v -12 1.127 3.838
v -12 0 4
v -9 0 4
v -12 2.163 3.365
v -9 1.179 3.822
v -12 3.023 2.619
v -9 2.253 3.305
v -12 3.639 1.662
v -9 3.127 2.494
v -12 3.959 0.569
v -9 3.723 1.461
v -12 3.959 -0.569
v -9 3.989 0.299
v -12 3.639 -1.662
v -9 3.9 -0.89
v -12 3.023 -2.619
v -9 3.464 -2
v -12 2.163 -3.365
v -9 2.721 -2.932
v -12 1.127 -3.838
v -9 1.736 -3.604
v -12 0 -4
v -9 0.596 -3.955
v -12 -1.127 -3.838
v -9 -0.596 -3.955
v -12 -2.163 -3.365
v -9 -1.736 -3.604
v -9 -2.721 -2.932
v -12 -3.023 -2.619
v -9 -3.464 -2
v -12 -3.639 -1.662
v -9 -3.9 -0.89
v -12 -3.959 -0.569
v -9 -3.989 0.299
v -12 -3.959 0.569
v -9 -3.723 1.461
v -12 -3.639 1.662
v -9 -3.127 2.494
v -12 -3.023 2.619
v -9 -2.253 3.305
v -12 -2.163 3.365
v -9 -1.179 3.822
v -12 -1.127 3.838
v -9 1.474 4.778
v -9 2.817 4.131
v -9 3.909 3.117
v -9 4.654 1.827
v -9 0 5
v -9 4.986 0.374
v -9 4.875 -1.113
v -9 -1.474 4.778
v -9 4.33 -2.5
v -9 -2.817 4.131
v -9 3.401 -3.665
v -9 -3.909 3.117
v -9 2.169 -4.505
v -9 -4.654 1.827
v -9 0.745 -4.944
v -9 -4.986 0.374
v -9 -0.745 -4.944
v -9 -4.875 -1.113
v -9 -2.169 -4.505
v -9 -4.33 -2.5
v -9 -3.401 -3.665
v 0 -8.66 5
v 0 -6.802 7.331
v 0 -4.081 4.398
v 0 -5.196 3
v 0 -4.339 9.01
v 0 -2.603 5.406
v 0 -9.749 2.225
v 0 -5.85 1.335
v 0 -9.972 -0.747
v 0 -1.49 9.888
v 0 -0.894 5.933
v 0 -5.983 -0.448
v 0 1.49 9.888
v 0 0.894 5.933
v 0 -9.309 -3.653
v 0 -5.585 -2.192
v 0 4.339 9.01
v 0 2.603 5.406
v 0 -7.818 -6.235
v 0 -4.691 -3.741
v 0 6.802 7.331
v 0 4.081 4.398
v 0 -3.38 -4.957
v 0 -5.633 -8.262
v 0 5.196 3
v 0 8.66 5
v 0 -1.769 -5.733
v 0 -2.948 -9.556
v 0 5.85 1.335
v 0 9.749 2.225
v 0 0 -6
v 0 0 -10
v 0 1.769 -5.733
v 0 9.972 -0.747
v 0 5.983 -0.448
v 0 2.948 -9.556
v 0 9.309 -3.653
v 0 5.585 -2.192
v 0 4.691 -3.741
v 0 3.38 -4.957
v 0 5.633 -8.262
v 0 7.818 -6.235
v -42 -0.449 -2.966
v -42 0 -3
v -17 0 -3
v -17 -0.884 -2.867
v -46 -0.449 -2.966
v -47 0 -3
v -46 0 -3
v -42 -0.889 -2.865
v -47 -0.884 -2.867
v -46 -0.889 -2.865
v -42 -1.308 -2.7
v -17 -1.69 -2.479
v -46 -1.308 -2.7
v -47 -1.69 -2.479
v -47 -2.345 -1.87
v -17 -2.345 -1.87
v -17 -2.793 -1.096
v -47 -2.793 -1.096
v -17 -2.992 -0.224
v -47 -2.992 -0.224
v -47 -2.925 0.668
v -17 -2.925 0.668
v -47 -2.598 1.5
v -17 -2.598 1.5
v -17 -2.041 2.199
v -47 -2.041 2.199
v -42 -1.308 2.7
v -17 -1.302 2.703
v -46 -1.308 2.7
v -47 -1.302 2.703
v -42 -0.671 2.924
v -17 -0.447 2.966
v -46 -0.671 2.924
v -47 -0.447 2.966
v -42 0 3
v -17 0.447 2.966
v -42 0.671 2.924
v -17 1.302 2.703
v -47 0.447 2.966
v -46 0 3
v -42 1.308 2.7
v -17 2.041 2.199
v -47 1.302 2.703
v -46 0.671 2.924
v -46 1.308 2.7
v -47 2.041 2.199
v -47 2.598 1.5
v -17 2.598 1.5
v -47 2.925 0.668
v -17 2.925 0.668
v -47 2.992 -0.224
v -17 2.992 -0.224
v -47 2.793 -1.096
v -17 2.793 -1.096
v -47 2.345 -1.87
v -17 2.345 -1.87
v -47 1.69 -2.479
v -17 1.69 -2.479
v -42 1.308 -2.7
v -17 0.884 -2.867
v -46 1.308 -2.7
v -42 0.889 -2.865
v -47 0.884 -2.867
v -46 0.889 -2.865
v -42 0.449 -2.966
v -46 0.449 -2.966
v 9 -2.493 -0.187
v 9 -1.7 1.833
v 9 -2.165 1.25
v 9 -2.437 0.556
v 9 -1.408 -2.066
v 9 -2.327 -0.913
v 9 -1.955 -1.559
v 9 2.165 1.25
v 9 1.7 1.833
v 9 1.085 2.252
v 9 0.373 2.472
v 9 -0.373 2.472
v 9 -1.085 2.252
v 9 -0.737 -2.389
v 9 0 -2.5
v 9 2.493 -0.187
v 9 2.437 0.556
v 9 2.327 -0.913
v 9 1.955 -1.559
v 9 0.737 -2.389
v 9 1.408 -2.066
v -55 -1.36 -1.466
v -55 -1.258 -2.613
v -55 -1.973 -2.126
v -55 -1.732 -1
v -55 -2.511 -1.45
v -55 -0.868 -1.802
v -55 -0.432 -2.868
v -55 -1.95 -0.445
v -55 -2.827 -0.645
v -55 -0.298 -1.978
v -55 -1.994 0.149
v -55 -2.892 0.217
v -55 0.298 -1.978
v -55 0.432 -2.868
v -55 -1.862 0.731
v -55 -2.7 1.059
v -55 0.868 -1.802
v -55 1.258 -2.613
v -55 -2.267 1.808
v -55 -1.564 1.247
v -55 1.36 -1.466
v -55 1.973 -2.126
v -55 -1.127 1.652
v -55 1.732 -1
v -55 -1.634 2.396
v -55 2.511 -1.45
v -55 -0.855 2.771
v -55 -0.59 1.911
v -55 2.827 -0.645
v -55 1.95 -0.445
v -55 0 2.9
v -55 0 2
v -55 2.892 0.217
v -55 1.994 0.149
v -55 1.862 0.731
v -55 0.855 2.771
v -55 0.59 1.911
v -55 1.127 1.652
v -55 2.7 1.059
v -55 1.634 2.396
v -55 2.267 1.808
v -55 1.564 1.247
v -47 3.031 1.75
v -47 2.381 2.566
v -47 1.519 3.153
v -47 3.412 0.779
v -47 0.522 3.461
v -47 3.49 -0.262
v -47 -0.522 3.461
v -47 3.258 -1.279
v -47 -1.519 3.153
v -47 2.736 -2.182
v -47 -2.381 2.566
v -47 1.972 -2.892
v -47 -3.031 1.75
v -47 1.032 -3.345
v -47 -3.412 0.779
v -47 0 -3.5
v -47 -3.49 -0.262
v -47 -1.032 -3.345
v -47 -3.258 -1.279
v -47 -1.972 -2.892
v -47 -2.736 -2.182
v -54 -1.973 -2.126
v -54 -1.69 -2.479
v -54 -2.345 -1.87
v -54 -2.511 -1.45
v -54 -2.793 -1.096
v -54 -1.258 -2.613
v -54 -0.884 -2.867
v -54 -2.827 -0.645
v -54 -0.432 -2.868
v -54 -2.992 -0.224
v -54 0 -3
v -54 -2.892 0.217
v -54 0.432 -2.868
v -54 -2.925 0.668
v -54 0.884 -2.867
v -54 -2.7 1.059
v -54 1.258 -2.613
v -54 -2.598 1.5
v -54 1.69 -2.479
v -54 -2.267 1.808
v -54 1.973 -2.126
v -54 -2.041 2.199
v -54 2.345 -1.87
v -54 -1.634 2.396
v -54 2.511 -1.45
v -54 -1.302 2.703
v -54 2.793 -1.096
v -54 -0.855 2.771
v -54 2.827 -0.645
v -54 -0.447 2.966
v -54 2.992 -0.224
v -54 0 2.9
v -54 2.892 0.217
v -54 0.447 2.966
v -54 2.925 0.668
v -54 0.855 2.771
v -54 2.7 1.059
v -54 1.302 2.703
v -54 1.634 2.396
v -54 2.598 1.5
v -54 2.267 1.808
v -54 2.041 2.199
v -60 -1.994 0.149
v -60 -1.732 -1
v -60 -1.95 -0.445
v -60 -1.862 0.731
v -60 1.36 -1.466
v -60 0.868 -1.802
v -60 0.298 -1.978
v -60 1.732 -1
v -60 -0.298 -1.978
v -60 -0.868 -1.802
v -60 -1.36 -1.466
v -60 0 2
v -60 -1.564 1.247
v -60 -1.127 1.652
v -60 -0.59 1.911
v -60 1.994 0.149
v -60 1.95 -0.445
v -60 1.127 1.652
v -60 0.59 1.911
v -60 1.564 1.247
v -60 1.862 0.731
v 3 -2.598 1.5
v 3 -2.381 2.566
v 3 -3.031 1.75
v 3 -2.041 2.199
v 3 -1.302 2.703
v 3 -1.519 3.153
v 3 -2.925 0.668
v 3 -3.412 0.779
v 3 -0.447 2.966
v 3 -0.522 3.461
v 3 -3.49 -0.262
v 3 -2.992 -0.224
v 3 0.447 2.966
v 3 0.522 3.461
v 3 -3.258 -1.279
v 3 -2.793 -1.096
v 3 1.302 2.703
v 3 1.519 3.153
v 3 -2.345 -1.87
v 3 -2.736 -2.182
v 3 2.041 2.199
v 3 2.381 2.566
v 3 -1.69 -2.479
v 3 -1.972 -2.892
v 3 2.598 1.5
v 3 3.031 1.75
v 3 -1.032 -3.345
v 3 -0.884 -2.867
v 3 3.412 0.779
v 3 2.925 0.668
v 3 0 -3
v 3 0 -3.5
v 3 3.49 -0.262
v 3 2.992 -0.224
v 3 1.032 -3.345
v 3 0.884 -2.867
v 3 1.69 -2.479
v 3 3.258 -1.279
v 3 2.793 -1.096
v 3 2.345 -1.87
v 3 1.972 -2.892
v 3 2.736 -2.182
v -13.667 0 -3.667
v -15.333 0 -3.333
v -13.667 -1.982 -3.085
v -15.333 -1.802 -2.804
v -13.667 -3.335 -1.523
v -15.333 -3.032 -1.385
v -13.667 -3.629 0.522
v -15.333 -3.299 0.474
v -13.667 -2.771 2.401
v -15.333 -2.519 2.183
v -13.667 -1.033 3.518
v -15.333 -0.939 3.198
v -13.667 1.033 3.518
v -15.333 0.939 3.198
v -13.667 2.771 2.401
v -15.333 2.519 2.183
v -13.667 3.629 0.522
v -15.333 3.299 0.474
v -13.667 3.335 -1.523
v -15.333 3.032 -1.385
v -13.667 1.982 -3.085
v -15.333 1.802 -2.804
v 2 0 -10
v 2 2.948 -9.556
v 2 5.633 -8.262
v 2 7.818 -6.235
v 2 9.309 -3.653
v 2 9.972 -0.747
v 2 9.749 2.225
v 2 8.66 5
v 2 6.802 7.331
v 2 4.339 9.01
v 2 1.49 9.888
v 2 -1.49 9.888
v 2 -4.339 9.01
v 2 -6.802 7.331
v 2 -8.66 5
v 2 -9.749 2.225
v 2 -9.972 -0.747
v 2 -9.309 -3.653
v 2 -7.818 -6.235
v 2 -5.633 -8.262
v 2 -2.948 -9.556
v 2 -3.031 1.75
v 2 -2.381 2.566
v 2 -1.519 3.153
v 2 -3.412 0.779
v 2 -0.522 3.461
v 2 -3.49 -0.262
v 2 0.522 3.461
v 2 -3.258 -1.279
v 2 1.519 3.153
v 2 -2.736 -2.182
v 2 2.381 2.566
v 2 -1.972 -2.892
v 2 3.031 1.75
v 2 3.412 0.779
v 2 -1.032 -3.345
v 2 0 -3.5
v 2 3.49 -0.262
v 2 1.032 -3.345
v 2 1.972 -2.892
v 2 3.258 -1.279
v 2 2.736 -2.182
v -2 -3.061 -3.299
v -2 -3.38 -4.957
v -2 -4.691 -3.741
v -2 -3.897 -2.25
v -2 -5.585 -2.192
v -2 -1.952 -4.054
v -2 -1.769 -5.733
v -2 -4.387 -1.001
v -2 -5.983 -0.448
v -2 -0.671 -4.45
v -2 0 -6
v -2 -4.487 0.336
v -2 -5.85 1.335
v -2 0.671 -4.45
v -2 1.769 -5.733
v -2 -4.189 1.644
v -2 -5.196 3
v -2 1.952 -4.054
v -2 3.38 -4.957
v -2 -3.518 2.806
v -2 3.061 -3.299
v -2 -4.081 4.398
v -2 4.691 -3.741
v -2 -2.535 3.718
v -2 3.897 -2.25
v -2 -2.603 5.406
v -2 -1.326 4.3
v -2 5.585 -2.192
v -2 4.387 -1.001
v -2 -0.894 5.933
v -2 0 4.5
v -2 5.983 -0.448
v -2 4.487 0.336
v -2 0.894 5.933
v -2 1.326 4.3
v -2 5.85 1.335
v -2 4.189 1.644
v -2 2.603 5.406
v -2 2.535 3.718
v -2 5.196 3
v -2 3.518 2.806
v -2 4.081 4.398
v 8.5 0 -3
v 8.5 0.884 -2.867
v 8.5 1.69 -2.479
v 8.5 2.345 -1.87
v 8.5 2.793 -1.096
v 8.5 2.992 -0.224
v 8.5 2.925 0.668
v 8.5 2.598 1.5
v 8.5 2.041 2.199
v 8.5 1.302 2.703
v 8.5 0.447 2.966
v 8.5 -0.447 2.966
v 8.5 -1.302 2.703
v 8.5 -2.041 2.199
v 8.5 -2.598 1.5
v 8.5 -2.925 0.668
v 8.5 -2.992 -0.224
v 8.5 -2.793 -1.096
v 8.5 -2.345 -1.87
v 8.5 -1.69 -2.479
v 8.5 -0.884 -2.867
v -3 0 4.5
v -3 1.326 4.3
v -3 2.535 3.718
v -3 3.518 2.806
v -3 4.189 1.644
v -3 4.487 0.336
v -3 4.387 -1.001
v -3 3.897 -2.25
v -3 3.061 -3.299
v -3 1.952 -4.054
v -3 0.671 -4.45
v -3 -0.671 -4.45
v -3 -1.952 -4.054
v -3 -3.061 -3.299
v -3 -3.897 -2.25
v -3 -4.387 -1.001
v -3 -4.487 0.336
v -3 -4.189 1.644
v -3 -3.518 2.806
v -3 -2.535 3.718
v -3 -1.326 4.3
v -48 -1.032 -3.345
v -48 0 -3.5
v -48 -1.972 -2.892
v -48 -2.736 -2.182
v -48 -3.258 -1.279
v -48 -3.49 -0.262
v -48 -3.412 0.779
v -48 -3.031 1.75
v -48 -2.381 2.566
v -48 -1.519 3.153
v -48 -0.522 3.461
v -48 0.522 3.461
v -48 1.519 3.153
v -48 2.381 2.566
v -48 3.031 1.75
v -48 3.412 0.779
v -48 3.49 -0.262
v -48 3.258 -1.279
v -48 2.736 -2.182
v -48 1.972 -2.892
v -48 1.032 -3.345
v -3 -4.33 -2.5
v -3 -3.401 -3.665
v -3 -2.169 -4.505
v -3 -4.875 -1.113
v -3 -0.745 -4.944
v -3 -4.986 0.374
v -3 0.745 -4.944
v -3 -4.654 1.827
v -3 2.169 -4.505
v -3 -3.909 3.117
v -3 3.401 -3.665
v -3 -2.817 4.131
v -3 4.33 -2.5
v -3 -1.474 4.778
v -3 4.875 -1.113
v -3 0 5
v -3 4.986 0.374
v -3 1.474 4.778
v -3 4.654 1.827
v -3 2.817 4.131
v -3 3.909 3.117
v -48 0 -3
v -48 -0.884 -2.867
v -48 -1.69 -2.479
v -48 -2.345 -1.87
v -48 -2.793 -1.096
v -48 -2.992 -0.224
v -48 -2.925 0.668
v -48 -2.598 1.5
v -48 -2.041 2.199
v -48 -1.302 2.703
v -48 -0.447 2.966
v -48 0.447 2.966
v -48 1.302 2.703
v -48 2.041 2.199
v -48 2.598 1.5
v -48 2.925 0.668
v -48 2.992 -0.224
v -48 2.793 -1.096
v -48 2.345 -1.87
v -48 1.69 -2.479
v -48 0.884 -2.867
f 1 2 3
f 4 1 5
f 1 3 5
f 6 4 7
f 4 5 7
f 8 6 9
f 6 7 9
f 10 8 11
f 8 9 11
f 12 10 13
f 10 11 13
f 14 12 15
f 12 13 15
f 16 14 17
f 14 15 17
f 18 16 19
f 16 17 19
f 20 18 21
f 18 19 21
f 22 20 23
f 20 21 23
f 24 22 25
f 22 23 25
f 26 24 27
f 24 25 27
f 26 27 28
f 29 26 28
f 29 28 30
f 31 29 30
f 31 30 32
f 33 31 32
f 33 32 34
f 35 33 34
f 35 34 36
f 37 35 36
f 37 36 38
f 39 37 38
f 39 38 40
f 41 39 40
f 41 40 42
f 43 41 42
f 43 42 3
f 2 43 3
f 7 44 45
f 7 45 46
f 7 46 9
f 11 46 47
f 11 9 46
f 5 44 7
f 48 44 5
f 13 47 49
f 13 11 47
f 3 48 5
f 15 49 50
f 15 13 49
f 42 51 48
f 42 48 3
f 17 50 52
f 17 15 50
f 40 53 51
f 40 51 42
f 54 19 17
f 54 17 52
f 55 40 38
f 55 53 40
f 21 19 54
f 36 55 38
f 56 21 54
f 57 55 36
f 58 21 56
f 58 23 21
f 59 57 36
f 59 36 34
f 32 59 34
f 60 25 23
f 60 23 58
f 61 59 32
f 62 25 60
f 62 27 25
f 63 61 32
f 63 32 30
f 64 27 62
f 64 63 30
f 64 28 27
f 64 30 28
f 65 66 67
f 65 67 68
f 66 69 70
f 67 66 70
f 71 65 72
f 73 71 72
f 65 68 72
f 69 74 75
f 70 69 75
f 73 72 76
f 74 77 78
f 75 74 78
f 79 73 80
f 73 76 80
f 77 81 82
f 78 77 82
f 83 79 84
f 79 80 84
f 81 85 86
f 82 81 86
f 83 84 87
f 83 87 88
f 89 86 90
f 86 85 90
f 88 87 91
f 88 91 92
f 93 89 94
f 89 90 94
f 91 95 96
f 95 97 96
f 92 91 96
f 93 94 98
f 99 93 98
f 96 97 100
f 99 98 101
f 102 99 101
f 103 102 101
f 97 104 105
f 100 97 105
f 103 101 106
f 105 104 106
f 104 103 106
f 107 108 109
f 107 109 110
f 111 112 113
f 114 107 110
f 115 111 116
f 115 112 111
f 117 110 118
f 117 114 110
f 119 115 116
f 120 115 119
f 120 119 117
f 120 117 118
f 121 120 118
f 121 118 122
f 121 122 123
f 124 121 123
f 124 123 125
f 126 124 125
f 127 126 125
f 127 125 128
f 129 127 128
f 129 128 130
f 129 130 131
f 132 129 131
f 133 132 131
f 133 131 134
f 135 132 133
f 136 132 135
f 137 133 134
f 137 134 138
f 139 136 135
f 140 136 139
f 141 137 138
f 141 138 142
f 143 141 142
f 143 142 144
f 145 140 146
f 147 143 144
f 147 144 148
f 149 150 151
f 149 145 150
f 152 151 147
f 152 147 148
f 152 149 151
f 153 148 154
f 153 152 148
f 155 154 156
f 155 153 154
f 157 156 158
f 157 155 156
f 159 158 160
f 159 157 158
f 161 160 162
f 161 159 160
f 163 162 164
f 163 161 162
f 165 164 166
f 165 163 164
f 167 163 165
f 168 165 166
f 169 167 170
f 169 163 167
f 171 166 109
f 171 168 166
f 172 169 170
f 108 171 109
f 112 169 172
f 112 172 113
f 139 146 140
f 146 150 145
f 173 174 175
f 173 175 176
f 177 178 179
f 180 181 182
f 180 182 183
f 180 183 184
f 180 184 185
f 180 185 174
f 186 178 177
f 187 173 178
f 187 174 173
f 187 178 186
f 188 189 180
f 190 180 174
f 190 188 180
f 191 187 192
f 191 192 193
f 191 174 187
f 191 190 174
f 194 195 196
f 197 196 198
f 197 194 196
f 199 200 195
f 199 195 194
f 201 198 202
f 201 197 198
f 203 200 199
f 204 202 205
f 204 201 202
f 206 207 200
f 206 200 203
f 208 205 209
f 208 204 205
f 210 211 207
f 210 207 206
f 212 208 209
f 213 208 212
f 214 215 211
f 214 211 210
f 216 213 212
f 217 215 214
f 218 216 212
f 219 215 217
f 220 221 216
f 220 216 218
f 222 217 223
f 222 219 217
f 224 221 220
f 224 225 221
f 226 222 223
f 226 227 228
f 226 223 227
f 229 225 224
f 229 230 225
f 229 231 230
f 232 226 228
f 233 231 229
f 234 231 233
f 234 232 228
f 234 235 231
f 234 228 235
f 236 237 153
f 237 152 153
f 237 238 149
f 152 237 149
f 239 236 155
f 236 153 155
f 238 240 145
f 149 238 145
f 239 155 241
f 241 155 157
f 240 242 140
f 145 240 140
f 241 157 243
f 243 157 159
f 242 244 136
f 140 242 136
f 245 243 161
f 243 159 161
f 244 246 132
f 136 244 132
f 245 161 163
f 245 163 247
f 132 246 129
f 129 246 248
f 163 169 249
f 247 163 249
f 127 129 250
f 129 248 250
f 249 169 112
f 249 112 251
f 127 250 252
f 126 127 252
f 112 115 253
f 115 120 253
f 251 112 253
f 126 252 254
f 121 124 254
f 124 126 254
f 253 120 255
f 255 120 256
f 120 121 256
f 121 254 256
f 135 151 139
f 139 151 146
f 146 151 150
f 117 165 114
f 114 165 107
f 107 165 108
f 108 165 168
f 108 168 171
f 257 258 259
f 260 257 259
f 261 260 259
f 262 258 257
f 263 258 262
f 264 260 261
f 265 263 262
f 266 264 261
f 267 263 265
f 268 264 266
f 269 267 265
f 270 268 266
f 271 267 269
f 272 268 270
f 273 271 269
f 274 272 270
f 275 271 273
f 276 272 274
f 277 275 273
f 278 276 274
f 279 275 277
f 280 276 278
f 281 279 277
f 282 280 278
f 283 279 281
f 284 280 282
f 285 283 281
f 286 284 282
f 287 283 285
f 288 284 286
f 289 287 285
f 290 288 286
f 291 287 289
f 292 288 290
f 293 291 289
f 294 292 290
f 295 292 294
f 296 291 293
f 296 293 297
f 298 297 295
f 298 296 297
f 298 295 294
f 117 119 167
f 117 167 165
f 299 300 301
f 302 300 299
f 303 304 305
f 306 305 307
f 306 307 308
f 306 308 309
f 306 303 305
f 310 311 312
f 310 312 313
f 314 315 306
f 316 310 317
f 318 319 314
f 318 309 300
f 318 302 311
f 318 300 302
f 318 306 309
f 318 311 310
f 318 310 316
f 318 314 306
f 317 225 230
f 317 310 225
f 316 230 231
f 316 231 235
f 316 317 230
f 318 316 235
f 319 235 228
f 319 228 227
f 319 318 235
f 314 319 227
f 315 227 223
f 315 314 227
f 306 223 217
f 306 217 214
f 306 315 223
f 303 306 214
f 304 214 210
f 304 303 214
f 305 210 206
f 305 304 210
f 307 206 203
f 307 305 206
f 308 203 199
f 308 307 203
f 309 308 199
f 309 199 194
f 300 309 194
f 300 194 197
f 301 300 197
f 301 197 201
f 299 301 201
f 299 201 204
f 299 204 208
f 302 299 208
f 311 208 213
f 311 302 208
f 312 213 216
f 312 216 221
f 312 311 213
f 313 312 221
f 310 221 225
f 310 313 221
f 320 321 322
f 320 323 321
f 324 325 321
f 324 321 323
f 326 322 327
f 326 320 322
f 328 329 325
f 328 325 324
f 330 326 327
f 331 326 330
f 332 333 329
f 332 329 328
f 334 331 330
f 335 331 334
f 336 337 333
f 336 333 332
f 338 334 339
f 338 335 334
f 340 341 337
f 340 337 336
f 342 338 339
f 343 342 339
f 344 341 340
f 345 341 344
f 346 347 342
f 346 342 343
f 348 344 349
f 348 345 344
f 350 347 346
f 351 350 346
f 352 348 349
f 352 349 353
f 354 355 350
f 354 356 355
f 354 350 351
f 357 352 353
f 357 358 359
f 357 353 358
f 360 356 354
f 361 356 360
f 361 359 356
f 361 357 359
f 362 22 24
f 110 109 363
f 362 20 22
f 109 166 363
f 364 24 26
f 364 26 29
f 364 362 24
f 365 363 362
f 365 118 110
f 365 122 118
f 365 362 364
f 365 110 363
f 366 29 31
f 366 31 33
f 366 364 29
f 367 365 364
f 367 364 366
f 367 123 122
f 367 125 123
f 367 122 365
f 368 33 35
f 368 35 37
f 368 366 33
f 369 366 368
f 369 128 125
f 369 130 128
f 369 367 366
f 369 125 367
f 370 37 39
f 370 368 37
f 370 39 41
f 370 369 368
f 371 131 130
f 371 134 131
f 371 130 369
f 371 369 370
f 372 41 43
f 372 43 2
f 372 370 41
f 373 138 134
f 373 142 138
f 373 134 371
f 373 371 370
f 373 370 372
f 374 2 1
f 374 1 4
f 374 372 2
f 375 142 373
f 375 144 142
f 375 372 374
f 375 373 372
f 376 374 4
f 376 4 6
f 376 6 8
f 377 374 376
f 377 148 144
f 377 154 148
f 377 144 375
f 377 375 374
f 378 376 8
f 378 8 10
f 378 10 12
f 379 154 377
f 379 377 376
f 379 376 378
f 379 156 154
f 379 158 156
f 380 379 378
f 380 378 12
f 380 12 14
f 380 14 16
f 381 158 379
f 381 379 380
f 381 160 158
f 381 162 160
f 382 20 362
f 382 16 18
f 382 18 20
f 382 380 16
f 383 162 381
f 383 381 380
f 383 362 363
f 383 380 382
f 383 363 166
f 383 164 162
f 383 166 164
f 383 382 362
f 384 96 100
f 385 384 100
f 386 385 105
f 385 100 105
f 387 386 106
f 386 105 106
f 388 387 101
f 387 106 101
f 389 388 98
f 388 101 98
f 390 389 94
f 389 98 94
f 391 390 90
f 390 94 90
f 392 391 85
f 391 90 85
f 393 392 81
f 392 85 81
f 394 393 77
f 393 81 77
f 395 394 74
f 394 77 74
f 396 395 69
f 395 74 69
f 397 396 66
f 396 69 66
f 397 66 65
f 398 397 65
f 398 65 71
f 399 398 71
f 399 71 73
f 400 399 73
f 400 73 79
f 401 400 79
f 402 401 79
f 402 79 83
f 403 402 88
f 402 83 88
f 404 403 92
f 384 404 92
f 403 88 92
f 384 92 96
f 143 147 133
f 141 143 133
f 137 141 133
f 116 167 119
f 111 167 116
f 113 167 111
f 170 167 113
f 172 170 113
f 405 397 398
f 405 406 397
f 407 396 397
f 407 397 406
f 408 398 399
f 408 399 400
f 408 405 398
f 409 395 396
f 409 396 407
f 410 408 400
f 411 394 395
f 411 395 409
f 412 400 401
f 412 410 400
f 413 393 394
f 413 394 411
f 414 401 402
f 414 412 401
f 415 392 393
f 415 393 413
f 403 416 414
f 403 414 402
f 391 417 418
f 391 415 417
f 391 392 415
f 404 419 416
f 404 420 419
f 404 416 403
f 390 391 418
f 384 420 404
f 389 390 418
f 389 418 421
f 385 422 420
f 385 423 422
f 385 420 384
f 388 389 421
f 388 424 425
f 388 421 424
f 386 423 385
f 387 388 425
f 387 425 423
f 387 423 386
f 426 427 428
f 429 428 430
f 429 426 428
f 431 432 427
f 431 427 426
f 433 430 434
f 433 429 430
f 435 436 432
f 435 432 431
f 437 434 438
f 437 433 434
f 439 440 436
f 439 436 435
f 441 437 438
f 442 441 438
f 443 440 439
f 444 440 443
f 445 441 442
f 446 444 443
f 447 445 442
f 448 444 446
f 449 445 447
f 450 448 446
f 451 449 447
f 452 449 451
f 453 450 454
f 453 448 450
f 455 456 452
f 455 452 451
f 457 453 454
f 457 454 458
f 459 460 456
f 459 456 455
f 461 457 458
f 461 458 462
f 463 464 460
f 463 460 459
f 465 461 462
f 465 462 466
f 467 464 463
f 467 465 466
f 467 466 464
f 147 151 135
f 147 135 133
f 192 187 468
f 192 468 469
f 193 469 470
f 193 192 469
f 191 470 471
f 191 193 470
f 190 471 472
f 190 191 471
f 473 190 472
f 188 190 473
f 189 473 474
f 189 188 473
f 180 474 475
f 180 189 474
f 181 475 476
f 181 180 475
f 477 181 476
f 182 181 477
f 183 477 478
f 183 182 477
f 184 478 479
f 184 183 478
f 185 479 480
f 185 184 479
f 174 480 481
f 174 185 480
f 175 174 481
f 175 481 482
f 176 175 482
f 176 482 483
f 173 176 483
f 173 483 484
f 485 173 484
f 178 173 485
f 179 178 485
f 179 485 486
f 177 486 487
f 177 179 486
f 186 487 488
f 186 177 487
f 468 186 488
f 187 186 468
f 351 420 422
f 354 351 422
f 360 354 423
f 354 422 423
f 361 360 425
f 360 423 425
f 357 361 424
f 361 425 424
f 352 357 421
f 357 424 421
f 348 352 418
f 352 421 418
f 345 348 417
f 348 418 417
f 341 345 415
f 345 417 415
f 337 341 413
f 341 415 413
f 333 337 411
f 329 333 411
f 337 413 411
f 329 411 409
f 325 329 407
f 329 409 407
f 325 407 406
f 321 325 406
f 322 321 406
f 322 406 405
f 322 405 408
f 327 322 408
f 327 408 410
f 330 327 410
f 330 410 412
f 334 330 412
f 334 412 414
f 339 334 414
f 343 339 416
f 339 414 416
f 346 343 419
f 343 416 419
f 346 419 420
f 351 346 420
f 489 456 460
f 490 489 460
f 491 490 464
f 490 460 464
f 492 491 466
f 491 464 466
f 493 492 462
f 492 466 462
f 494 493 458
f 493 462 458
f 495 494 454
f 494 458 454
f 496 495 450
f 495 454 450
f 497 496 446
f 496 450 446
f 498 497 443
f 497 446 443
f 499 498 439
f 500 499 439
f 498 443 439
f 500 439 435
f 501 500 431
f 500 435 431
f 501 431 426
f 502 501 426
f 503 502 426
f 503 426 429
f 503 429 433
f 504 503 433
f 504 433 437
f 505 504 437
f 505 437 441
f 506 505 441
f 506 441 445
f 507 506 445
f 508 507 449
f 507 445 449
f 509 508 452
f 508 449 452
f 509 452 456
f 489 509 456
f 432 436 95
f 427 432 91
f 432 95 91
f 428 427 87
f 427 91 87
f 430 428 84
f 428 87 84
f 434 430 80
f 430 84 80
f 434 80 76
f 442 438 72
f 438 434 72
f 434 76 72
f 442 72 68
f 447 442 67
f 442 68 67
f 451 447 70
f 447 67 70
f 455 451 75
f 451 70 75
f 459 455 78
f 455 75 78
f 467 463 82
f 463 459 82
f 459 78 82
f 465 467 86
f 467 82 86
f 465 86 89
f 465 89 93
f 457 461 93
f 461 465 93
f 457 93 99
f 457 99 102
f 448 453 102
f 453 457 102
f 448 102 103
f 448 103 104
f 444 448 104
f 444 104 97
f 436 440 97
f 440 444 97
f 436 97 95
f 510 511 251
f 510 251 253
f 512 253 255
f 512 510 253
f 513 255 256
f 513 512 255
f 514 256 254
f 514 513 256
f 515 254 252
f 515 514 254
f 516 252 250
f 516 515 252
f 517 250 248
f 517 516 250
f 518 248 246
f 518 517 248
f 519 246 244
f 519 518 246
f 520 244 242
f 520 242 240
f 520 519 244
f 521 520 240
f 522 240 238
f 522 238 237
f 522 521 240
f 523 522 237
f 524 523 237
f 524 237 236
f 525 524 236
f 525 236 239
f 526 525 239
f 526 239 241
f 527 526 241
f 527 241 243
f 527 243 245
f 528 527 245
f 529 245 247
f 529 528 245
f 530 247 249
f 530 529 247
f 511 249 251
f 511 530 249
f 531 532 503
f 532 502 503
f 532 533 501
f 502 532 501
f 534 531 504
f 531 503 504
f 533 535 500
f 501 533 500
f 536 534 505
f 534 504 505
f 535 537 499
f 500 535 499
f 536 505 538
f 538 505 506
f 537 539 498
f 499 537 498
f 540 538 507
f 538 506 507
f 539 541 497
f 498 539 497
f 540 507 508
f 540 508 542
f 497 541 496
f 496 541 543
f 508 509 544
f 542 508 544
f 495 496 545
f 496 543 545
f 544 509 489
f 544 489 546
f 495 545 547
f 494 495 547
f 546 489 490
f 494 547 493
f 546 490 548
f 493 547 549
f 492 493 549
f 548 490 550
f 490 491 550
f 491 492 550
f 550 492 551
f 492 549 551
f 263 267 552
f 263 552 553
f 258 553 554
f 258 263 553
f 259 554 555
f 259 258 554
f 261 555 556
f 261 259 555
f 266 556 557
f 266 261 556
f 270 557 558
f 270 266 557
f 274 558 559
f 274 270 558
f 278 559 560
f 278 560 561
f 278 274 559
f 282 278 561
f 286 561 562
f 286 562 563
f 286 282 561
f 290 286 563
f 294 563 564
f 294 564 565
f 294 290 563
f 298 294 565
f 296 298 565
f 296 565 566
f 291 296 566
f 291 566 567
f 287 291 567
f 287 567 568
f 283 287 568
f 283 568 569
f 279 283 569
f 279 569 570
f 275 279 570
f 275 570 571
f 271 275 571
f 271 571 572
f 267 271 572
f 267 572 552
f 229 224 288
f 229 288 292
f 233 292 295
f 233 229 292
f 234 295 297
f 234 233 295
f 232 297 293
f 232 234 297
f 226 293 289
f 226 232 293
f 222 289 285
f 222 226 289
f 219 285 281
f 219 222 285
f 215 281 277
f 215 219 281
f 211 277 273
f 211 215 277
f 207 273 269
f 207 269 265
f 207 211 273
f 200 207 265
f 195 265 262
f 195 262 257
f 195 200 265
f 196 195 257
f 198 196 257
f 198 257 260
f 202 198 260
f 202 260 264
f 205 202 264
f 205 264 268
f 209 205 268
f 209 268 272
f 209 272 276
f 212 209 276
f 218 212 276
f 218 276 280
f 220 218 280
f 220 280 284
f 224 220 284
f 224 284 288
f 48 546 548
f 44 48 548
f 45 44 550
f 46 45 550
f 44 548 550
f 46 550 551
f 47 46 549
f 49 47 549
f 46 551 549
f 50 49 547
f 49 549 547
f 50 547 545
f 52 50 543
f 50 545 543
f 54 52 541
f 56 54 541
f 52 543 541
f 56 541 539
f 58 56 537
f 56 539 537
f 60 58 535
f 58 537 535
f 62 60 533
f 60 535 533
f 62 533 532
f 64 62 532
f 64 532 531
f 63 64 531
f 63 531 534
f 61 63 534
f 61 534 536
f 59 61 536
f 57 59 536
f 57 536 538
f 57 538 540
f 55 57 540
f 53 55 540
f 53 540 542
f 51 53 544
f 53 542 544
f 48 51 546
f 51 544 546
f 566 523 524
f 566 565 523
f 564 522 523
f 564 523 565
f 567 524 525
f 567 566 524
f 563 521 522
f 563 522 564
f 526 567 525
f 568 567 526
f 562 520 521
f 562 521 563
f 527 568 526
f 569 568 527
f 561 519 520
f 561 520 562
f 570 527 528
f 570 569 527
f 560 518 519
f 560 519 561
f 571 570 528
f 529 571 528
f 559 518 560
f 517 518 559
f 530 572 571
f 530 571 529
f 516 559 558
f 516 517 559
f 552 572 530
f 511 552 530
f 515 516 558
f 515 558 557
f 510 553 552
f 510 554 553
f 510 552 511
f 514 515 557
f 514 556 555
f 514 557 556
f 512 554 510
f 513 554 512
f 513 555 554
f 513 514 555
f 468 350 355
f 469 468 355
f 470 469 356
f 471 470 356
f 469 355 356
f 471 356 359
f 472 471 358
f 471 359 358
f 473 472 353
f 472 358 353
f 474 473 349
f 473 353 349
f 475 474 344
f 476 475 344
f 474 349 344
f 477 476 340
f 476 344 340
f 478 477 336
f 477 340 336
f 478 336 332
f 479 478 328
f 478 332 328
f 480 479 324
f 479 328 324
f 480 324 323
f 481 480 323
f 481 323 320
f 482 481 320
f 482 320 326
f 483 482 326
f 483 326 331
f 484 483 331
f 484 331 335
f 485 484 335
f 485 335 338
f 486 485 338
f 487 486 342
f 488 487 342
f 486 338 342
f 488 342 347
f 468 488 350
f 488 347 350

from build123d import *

# Parameters (mm, degrees)
SKETCH_1_R          = 10
EXTRUDE_1_DEPTH     = 2
SKETCH_2_R          = 3.5
EXTRUDE_2_DEPTH     = 1
SKETCH_3_R          = 6
EXTRUDE_3_DEPTH     = 9
SKETCH_4_R          = 4
EXTRUDE_4_DEPTH     = 3
SKETCH_5_R          = 3
EXTRUDE_5_DEPTH     = 6
EXTRUDE_START       = 35
SKETCH_6_R          = 3
EXTRUDE_6_DEPTH     = 35
EXTRUDE_START_2     = 1
SKETCH_7_R          = 3.5
EXTRUDE_7_DEPTH     = 1
EXTRUDE_START_3     = 9
SKETCH_8_R          = 3
EXTRUDE_8_DEPTH     = 9
SKETCH_9_R          = 2
EXTRUDE_9_DEPTH     = 3
CHAMFER_1_SIZE      = 0.5
SKETCH_11_W         = 4
SKETCH_11_H         = 0.3
CUT_EXTRUDE_2_DEPTH = 5
CUT_EXTRUDE_START   = 2
SKETCH_12_R         = 6
SKETCH_12_R_2       = 4.5
CUT_EXTRUDE_3_DEPTH = 1
CUT_EXTRUDE_START_2 = -6
SKETCH_13_R         = 6
SKETCH_13_R_2       = 5
CUT_EXTRUDE_4_DEPTH = 6
SKETCH_15_R         = 3
SKETCH_15_R_2       = 2.9
CUT_EXTRUDE_5_DEPTH = 3
SKETCH_16_R         = 2.9
SKETCH_16_R_2       = 2
CUT_EXTRUDE_8_DEPTH = 2


with BuildPart() as part:
    # 草图1 → 凸台-拉伸1 (new body)
    with BuildSketch(Plane(origin=(0, 0, 0), x_dir=(0, 0, -1), z_dir=(1, 0, 0))):
        Circle(SKETCH_1_R)
    extrude(amount=EXTRUDE_1_DEPTH)

    # 草图2 → 凸台-拉伸2 (add)
    with BuildSketch(Plane(origin=(2, 0, 0), x_dir=(0, 0, -1), z_dir=(1, 0, 0))):
        Circle(SKETCH_2_R)
    extrude(amount=EXTRUDE_2_DEPTH)

    # 草图3 → 凸台-拉伸3 (add)
    with BuildSketch(Plane.ZY):
        with Locations(Location((0, 0, 0), (0, 0, 180))):
            Circle(SKETCH_3_R)
    extrude(amount=EXTRUDE_3_DEPTH)

    # 草图4 → 凸台-拉伸4 (add)
    with BuildSketch(Plane.ZY.offset(9)):
        Circle(SKETCH_4_R)
    extrude(amount=EXTRUDE_4_DEPTH)

    # 草图5 → 凸台-拉伸5 (add)
    with BuildSketch(Plane(origin=(3, 0, 0), x_dir=(0, 0, -1), z_dir=(1, 0, 0))):
        Circle(SKETCH_5_R)
    extrude(amount=EXTRUDE_5_DEPTH)

    # 草图6 → 凸台-拉伸6 (add)
    with BuildSketch(Plane.ZY.offset(12).offset(EXTRUDE_START)):
        with Locations(Location((0, 0, 0), (0, 0, 180))):
            Circle(SKETCH_6_R)
    extrude(amount=-EXTRUDE_6_DEPTH)

    # 草图7 → 凸台-拉伸7 (add)
    with BuildSketch(Plane.ZY.offset(47).offset(EXTRUDE_START_2)):
        with Locations(Location((0, 0, 0), (0, 0, 180))):
            Circle(SKETCH_7_R)
    extrude(amount=-EXTRUDE_7_DEPTH)

    # 草图8 → 凸台-拉伸8 (add)
    with BuildSketch(Plane.ZY.offset(48).offset(EXTRUDE_START_3)):
        with Locations(Location((0, 0, 0), (0, 0, 180))):
            Circle(SKETCH_8_R)
    extrude(amount=-EXTRUDE_8_DEPTH)

    # 草图9 → 凸台-拉伸9 (add)
    with BuildSketch(Plane.ZY.offset(57)):
        Circle(SKETCH_9_R)
    extrude(amount=EXTRUDE_9_DEPTH)

    # 倒角1
    chamfer_1_edges = [part.edges().sort_by_distance(p)[0] for p in [
        (9, 0, 3),
    ]]
    chamfer(chamfer_1_edges, length=CHAMFER_1_SIZE)

    # 草图11 → 切除-拉伸2 (cut, symmetric)
    with BuildSketch(Plane(origin=(0, 0, 0), x_dir=(1, 0, 0), z_dir=(0, 1, 0))):
        with Locations((-44, 2.85)):
            Rectangle(SKETCH_11_W, SKETCH_11_H)
        with Locations((-44, -2.85)):
            Rectangle(SKETCH_11_W, SKETCH_11_H)
    extrude(amount=CUT_EXTRUDE_2_DEPTH, both=True, mode=Mode.SUBTRACT)

    # 草图12 → 切除-拉伸3 (cut)
    with BuildSketch(Plane.ZY.offset(CUT_EXTRUDE_START)):
        Circle(SKETCH_12_R)
        Circle(SKETCH_12_R_2, mode=Mode.SUBTRACT)
    extrude(amount=CUT_EXTRUDE_3_DEPTH, mode=Mode.SUBTRACT)

    # 草图13 → 切除-拉伸4 (cut)
    with BuildSketch(Plane.ZY.offset(9).offset(CUT_EXTRUDE_START_2)):
        with Locations(Location((0, 0, 0), (0, 0, 180))):
            Circle(SKETCH_13_R)
        Circle(SKETCH_13_R_2, mode=Mode.SUBTRACT)
    extrude(amount=CUT_EXTRUDE_4_DEPTH, mode=Mode.SUBTRACT)

    # 草图14 → 旋转1 (revolve)
    with BuildSketch(Plane.XY, mode=Mode.PRIVATE) as revolve_1_sk:
        Polygon((-12, 4), (-17, 3), (-12, 3), align=None)
    revolve(revolve_1_sk.sketch.rotate(Axis((-6.238584256, 0, 0), (-1, 0, 0)), 90), axis=Axis((-6.238584256, 0, 0), (-1, 0, 0)))

    # 草图15 → 切除-拉伸5 (cut)
    with BuildSketch(Plane.ZY.offset(57)):
        Circle(SKETCH_15_R)
        Circle(SKETCH_15_R_2, mode=Mode.SUBTRACT)
    extrude(amount=-CUT_EXTRUDE_5_DEPTH, mode=Mode.SUBTRACT)

    # 草图16 → 切除-拉伸8 (cut)
    with BuildSketch(Plane.ZY.offset(57)):
        Circle(SKETCH_16_R)
        Circle(SKETCH_16_R_2, mode=Mode.SUBTRACT)
    extrude(amount=-CUT_EXTRUDE_8_DEPTH, mode=Mode.SUBTRACT)


solid = part.part
